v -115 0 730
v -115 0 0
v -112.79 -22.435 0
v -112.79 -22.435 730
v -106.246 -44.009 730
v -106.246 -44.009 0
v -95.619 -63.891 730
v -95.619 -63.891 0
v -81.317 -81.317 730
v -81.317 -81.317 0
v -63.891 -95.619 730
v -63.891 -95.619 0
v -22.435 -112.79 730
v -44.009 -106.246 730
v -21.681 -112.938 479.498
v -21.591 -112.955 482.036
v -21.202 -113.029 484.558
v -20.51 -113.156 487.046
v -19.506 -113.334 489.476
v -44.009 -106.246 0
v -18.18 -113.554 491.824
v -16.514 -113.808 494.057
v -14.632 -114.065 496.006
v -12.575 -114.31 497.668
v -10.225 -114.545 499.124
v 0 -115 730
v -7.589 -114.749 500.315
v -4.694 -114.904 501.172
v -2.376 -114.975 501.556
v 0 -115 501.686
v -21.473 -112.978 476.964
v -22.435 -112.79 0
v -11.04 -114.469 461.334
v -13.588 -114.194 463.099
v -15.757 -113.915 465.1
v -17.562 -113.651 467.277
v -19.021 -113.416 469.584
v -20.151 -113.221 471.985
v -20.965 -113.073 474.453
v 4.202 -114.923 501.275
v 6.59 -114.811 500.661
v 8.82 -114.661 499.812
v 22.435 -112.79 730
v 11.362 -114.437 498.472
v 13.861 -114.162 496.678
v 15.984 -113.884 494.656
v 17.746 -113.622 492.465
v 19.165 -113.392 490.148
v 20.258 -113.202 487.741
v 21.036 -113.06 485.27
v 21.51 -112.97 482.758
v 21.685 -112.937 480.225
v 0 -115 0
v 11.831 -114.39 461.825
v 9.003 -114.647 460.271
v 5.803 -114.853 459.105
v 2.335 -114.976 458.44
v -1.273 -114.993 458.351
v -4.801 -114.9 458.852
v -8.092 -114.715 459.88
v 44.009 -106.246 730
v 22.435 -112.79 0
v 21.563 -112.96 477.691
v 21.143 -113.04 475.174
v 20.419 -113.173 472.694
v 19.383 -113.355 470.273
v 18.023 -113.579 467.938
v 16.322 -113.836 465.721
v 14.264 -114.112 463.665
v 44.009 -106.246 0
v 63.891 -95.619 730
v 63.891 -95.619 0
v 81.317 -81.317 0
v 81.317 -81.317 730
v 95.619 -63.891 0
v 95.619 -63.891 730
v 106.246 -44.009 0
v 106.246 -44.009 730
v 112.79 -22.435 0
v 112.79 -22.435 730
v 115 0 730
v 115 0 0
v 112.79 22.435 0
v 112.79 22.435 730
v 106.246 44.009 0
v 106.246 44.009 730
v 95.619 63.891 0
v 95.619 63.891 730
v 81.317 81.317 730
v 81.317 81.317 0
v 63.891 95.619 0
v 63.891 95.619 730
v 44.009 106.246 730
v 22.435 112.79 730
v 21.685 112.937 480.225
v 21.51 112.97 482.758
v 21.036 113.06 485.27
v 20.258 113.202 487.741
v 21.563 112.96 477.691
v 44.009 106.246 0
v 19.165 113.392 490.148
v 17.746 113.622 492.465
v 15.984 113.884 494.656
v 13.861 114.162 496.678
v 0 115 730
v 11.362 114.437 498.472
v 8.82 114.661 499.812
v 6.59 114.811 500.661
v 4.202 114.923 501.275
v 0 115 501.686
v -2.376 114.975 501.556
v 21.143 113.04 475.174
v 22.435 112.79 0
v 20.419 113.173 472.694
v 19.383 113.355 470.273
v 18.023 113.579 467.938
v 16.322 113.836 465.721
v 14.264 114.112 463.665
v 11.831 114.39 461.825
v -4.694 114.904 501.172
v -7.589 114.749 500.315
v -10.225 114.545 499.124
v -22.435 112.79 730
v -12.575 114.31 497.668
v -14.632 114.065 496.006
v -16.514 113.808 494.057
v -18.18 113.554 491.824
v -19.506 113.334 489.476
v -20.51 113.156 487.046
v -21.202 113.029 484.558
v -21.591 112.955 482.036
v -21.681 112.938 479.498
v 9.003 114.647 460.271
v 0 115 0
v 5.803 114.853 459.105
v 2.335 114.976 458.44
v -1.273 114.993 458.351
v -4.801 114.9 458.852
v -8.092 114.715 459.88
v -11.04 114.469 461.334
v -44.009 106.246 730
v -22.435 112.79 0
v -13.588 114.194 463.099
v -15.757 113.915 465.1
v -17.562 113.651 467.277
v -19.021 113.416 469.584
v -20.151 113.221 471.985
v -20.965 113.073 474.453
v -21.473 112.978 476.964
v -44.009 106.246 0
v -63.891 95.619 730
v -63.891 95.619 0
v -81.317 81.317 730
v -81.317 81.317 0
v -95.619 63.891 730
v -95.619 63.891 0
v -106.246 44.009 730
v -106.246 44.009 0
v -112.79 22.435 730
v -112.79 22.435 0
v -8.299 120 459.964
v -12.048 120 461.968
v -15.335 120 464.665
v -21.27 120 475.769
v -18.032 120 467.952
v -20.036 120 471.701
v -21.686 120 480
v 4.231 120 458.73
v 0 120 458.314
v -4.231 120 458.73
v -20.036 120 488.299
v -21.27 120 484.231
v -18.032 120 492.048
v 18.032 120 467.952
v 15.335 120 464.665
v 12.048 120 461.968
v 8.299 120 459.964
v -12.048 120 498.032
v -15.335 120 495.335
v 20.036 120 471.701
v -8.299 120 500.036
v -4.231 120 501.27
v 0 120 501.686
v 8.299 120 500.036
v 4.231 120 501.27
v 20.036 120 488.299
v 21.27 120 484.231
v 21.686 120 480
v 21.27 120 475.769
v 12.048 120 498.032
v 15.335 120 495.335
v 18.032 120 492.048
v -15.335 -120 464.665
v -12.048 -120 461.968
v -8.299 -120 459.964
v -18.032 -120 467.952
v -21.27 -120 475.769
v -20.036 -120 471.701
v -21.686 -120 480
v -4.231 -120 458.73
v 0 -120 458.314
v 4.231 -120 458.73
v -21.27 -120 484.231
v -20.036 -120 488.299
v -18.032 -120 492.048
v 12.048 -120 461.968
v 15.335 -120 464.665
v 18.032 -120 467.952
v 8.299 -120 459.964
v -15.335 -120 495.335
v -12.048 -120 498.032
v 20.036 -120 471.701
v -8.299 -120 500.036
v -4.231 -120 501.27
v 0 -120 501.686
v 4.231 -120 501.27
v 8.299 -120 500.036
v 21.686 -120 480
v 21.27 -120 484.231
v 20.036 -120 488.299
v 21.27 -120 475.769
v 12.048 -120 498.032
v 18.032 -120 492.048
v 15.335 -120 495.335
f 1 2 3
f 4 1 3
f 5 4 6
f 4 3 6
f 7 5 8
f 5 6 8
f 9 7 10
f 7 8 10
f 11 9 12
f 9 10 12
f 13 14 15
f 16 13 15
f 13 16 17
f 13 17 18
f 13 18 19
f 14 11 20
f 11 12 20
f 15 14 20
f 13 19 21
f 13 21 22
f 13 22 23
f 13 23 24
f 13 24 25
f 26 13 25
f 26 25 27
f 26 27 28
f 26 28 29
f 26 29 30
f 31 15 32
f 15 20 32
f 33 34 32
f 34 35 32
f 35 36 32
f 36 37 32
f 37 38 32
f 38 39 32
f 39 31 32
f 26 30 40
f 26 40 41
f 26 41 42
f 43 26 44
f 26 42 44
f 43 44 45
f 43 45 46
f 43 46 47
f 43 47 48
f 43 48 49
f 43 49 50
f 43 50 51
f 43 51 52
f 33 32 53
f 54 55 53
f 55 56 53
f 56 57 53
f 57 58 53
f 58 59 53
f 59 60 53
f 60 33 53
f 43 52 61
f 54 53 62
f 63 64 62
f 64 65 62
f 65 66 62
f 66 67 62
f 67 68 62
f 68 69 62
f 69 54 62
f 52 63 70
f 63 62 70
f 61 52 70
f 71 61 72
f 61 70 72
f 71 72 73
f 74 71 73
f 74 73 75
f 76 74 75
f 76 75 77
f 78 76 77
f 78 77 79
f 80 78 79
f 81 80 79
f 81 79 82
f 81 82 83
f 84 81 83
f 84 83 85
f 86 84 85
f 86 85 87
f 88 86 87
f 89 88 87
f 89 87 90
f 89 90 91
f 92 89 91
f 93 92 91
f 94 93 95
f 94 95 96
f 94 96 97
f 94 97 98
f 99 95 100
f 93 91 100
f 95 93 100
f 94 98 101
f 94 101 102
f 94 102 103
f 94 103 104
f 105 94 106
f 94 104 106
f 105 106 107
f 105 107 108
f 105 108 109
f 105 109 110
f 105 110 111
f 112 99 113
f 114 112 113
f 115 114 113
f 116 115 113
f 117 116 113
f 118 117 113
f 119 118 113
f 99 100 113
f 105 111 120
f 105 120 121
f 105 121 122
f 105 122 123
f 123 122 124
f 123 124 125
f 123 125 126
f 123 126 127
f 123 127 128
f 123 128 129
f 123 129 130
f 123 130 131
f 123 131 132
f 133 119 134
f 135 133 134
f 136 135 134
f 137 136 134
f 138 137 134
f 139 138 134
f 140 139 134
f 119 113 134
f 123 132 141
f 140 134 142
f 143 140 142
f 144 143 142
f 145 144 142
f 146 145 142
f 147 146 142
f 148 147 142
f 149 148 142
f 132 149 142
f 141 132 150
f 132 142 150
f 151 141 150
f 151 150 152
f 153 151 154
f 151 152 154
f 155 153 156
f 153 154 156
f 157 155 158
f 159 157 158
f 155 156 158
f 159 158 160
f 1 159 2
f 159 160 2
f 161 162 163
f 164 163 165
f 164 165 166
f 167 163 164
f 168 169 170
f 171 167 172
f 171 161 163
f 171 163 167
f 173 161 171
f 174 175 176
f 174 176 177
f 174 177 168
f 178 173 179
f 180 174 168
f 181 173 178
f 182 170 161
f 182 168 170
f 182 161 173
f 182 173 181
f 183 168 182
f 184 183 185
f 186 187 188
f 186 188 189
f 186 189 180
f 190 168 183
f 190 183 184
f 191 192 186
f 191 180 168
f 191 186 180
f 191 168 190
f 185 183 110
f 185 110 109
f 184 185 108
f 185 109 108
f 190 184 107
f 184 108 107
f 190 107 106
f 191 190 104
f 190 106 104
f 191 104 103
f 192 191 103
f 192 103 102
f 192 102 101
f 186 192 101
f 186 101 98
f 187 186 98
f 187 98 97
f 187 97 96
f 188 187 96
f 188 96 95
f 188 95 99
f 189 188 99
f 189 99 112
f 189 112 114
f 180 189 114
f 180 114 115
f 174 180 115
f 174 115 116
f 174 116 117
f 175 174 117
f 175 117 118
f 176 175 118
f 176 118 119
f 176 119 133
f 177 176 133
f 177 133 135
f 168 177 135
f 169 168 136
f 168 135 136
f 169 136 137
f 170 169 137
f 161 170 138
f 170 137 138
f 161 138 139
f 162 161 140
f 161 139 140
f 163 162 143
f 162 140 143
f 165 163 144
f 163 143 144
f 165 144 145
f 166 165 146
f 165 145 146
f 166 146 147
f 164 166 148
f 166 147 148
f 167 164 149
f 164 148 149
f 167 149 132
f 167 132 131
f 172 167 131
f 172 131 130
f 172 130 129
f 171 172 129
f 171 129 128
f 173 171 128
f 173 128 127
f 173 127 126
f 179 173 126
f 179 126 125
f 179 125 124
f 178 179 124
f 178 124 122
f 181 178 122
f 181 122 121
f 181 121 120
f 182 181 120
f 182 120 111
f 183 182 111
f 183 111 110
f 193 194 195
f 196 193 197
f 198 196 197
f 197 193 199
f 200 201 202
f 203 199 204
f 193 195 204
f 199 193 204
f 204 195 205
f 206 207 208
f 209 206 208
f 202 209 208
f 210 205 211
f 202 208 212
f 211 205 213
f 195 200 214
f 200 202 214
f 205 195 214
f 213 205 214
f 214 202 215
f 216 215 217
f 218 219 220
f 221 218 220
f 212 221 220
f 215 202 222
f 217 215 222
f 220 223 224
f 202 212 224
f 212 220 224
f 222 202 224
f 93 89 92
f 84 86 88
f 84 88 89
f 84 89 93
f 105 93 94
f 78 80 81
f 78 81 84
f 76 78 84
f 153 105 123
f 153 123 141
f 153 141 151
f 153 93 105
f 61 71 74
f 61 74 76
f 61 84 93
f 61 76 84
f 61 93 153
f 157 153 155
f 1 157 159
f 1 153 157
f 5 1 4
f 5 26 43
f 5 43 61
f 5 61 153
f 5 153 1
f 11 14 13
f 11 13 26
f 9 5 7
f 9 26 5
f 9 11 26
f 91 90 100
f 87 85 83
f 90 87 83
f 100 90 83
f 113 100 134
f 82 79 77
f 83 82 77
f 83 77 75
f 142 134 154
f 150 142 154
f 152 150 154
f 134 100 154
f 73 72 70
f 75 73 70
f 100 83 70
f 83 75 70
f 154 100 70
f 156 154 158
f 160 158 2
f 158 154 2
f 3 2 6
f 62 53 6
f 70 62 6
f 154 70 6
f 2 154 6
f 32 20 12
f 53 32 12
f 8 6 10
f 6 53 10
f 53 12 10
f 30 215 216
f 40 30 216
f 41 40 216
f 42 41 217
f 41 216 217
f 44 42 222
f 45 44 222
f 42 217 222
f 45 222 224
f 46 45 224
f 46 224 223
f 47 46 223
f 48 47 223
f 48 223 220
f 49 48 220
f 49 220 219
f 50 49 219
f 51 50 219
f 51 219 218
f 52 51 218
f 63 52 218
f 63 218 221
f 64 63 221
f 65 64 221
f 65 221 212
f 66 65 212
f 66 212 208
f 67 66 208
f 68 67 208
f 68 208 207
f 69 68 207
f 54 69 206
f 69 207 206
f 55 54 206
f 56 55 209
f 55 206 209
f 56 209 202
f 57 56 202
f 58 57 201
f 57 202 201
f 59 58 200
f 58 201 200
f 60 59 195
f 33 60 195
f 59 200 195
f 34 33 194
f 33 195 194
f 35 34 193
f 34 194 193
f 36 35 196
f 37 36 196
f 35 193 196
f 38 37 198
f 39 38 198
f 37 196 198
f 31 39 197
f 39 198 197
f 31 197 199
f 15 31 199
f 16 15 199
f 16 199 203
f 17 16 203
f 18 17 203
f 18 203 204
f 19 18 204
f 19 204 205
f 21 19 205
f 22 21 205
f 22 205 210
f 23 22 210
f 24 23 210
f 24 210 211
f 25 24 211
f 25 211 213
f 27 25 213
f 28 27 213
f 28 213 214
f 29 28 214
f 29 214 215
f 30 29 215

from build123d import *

# Parameters (mm, degrees)
SKIZZE1_R                            = 115
AUFSATZ_LINEAR_AUSTRAGEN1_DEPTH      = 730
AUFSATZ_LINEAR_AUSTRAGEN2_DEPTH      = 120
AUFSATZ_LINEAR_AUSTRAGEN2_DEPTH_BACK = 120
SKIZZE2_R                            = 21.686343762


with BuildPart() as part:
    # Skizze1 → Aufsatz-Linear austragen1 (new body)
    with BuildSketch(Plane.XY):
        Circle(SKIZZE1_R)
    extrude(amount=AUFSATZ_LINEAR_AUSTRAGEN1_DEPTH)

    # Skizze2 → Aufsatz-Linear austragen2 (add, two sides: drawn at the far end of the back side and taken through both)
    with BuildSketch(Plane(origin=(0, 0, 0), x_dir=(1, 0, 0), z_dir=(0, 1, 0)).offset(-AUFSATZ_LINEAR_AUSTRAGEN2_DEPTH_BACK)):
        with Locations((0, -480)):
            Circle(SKIZZE2_R)
    extrude(amount=AUFSATZ_LINEAR_AUSTRAGEN2_DEPTH + AUFSATZ_LINEAR_AUSTRAGEN2_DEPTH_BACK)


solid = part.part
